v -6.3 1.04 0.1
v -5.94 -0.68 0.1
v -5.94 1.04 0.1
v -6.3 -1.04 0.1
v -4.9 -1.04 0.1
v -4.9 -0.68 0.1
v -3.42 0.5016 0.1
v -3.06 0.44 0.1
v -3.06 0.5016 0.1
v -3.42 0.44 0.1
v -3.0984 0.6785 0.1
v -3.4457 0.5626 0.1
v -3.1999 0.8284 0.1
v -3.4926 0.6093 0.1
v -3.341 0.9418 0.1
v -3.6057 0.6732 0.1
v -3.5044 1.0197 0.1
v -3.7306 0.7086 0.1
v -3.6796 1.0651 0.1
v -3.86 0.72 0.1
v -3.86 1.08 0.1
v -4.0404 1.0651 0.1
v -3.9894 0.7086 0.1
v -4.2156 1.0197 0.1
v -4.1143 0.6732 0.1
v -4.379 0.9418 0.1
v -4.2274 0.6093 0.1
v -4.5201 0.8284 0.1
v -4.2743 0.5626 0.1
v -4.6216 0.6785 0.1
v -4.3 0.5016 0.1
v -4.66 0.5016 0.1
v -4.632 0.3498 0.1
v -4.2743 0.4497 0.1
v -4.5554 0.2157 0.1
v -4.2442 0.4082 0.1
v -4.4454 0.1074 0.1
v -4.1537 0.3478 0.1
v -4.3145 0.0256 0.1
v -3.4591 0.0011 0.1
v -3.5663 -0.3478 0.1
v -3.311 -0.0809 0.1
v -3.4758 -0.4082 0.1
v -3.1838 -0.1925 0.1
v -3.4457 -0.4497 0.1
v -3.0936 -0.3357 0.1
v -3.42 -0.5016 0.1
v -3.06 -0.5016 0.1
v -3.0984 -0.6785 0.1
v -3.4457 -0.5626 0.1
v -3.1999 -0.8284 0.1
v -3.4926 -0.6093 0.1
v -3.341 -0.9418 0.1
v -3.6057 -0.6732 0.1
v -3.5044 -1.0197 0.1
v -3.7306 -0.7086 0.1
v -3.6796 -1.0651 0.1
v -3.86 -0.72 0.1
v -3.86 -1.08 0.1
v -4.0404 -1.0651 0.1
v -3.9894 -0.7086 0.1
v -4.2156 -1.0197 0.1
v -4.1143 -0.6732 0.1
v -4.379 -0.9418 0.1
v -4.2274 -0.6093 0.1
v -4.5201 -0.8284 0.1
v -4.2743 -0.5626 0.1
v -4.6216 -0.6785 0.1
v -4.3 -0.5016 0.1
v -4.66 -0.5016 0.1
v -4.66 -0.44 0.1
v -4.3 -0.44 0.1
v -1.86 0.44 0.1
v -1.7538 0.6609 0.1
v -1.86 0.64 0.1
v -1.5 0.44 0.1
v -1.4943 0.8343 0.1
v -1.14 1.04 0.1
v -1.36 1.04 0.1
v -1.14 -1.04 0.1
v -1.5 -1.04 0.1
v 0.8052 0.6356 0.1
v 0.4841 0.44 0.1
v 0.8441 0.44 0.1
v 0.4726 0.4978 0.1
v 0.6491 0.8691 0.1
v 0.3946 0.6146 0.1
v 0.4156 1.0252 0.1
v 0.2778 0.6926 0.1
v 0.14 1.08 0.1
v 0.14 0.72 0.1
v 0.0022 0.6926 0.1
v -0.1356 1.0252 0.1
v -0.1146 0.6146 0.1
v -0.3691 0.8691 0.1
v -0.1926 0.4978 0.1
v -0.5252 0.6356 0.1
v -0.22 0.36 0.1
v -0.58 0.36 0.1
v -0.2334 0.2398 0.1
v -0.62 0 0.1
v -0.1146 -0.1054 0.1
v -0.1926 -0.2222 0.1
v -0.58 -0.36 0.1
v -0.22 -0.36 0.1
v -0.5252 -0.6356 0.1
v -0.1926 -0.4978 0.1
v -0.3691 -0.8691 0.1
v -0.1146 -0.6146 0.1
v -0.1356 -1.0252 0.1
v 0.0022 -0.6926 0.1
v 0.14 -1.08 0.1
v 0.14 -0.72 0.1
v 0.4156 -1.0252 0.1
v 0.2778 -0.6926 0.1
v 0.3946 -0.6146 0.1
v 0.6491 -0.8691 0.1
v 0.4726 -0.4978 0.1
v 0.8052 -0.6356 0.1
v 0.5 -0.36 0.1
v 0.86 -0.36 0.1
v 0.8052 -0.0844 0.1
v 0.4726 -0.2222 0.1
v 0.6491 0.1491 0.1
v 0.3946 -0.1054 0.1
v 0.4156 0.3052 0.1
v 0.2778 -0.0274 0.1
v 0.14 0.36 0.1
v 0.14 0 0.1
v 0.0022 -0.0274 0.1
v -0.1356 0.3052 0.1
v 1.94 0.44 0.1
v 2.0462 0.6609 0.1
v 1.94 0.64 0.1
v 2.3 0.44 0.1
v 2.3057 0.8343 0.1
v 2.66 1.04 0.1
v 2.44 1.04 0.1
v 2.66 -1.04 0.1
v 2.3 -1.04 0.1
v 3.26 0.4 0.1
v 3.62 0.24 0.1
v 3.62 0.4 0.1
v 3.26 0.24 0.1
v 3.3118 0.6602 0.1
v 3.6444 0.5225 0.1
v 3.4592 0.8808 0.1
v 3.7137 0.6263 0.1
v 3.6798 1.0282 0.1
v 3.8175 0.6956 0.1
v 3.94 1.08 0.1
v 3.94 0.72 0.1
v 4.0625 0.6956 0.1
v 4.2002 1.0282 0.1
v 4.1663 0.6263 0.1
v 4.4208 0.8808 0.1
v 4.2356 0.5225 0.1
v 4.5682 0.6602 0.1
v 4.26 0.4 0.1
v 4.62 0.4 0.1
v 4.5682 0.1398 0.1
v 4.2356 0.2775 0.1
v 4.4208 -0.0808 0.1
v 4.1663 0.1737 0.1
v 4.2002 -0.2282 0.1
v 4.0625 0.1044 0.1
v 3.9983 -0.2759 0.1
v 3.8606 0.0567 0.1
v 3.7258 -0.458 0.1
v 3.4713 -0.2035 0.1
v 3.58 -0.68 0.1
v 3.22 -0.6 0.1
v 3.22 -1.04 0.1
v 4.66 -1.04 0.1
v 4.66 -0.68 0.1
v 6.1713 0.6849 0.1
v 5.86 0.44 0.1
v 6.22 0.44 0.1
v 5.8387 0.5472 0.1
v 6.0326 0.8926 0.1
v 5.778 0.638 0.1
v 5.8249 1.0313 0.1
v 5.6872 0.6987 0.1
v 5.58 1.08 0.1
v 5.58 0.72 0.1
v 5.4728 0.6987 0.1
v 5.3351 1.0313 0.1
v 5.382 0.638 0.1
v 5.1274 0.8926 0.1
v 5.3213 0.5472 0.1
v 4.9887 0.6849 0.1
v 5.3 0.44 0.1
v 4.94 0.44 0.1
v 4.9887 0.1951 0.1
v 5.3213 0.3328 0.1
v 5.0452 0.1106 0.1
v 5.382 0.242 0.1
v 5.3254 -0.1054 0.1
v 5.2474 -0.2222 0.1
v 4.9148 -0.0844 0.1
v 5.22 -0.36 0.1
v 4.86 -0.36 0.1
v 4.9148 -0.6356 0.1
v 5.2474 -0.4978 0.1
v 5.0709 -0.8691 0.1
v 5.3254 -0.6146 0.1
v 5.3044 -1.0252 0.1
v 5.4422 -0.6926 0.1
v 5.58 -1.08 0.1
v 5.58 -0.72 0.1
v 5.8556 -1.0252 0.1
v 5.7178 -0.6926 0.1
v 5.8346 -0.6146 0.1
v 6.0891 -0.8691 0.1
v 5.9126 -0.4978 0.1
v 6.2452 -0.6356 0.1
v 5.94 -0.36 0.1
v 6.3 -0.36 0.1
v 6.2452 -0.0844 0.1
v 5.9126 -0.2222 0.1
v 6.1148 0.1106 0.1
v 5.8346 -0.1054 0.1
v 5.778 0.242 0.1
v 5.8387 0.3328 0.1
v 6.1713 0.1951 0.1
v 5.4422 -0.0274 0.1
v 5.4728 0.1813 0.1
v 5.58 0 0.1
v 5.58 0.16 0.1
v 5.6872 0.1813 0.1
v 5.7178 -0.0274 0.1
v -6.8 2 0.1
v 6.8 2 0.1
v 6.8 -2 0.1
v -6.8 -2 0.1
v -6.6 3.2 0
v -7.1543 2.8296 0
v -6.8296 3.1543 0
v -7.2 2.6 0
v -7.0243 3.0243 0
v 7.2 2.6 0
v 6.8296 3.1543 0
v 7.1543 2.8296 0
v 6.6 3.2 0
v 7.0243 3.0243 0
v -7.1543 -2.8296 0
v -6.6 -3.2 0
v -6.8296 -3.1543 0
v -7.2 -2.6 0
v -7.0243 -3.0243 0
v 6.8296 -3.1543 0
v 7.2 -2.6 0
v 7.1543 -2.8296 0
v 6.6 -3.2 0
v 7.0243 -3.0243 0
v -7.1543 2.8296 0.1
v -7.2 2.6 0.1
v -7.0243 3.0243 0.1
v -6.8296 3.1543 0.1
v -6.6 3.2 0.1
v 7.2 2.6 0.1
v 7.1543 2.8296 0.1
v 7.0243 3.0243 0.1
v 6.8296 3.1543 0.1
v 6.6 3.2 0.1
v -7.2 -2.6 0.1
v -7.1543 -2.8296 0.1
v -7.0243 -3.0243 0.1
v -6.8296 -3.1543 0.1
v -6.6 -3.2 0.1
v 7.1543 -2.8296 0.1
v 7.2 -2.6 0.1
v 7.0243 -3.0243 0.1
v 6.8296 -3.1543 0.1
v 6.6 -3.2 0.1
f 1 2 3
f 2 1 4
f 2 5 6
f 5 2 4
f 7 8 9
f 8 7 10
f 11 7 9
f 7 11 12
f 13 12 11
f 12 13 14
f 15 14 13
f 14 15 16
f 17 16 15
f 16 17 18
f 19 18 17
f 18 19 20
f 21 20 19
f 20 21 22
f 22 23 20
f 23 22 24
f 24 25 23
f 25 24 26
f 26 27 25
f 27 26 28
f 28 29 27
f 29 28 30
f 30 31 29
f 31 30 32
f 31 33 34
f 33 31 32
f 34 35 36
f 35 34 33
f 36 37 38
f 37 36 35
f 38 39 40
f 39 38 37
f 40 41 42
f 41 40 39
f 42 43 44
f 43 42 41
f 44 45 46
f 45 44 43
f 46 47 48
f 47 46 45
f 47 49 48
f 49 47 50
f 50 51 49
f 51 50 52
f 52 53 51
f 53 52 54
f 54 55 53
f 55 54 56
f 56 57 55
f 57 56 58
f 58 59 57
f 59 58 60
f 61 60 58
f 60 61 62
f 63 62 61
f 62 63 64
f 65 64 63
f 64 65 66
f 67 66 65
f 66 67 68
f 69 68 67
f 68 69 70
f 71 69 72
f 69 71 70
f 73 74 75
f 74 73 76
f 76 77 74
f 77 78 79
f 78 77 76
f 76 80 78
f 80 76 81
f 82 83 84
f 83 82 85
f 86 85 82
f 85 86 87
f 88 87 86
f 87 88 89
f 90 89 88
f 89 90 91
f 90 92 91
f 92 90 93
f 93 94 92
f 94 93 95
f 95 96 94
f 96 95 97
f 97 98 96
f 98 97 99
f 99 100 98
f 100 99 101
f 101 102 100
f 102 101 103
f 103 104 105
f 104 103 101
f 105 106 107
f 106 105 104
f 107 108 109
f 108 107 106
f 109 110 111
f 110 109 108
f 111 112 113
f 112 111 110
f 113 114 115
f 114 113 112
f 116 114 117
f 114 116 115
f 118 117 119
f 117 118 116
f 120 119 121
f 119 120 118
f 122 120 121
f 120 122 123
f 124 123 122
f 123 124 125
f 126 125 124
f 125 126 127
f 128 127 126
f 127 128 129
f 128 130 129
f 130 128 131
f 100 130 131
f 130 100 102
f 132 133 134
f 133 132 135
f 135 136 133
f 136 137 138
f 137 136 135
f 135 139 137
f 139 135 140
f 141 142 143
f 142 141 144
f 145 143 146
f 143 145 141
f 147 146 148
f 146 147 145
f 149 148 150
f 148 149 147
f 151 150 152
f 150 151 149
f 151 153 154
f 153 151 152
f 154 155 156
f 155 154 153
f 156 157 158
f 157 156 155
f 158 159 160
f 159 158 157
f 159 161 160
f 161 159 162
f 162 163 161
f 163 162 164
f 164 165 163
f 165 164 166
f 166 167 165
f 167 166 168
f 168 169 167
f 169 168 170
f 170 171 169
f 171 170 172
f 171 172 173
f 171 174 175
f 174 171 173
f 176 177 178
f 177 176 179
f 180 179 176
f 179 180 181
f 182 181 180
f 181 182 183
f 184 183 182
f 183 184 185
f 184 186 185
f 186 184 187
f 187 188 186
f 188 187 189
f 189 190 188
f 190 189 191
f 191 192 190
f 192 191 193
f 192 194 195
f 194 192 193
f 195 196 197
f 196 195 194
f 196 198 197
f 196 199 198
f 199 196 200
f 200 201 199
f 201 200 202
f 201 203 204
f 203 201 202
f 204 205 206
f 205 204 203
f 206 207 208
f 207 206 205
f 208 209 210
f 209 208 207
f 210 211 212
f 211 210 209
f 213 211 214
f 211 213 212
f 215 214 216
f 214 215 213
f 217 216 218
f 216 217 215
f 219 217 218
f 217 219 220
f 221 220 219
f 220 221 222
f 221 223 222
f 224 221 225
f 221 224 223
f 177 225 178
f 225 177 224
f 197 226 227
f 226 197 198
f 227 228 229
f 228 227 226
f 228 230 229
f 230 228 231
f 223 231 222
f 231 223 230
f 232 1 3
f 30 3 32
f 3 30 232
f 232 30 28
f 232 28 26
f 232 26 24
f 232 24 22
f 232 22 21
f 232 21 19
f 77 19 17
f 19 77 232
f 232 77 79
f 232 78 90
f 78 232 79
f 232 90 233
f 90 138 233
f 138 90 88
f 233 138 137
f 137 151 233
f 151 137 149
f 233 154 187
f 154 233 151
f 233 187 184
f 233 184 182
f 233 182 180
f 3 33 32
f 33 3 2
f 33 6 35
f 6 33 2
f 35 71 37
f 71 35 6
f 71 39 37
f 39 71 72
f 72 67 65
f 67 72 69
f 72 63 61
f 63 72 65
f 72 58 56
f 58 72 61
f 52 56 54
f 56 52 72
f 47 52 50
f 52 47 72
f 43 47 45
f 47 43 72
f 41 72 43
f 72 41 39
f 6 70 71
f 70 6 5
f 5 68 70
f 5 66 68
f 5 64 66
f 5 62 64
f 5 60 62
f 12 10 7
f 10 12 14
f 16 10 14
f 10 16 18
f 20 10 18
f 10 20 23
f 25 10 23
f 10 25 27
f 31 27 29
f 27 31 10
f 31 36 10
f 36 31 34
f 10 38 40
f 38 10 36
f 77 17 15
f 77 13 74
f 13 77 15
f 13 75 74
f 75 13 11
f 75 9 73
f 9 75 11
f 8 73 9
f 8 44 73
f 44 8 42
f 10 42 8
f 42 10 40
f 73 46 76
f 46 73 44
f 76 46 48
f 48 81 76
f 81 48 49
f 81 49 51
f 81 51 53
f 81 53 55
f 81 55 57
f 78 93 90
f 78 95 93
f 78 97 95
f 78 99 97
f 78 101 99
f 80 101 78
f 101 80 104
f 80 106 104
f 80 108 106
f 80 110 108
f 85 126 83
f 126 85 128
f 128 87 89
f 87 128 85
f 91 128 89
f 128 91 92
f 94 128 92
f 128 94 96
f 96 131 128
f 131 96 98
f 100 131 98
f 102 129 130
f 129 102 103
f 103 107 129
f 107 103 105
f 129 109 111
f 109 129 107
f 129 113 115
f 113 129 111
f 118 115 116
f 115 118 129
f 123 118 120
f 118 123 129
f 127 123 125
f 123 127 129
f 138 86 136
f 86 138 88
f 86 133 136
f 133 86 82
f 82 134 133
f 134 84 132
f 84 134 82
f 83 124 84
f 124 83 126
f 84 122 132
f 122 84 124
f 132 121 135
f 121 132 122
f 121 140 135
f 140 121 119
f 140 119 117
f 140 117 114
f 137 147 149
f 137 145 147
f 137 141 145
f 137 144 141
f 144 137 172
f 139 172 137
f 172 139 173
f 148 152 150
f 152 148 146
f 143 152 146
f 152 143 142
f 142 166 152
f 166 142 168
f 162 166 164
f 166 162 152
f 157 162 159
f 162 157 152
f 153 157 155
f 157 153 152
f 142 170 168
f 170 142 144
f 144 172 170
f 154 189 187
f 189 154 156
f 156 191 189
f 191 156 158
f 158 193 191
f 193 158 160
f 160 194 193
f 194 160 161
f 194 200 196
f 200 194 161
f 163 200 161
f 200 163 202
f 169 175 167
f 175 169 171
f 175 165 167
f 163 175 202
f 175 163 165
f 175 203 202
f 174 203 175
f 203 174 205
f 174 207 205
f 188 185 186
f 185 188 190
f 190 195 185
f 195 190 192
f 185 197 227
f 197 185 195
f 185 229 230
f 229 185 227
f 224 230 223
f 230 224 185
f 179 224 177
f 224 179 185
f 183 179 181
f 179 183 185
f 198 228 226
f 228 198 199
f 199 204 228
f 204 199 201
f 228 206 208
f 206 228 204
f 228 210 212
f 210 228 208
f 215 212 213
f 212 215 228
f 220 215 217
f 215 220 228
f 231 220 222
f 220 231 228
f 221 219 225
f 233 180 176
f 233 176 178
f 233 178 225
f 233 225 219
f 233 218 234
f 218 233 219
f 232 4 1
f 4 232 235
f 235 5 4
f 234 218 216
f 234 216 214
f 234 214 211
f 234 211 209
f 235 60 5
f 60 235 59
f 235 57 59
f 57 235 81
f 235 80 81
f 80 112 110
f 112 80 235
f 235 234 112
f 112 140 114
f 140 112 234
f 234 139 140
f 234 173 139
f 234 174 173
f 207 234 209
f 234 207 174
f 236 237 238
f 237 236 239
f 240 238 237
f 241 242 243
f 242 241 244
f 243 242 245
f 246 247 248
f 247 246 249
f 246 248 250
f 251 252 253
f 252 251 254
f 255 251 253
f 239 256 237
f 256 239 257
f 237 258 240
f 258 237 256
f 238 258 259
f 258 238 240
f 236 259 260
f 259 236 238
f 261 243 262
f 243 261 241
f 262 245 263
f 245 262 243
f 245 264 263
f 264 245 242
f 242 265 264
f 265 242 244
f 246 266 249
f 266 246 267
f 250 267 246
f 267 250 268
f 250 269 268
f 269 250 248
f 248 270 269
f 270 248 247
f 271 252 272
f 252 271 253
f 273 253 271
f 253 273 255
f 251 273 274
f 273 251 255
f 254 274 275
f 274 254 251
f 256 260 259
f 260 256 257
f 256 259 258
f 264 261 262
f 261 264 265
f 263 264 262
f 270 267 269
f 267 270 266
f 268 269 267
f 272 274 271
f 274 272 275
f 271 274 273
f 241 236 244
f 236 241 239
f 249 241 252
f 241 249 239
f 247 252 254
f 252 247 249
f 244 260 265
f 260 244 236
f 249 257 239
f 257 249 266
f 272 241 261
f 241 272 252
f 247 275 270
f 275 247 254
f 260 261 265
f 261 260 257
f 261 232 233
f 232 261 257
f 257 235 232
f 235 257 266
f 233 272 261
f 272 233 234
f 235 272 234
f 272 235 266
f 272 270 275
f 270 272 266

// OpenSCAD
// file: ../p/1-4cyli.scad
use <../lib.scad>
function ldraw_lib__1_4cyli() = [
// 0 Cylinder 0.25
// 0 Name: 1-4cyli.dat
// 0 Author: James Jessiman
// 0 !LDRAW_ORG Primitive UPDATE 2012-01
// 0 !LICENSE Licensed under CC BY 4.0 : see CAreadme.txt
// 
// 0 BFC CERTIFY CCW
  [0,"BFC","CERTIFY"],
  [0,"BFC","CCW"],
// 
// 0 !HISTORY 2002-03-23 [sbliss] Added BFC statement.
// 0 !HISTORY 2002-04-25 [PTadmin] Official Update 2002-02
// 0 !HISTORY 2007-06-22 [PTadmin] Header formatted for Contributor Agreement
// 0 !HISTORY 2008-07-01 [PTadmin] Official Update 2008-01
// 0 !HISTORY 2012-02-16 [Philo] Changed to CCW
// 0 !HISTORY 2012-03-30 [PTadmin] Official Update 2012-01
// 
// 
// 4 16 1 1 0 0.9239 1 0.3827 0.9239 0 0.3827 1 0 0
  [4,16,1,1,0,0.9239,1,0.3827,0.9239,0,0.3827,1,0,0],
// 5 24 1 0 0 1 1 0 0.9239 0 0.3827 1 0 -1
  [5,24,1,0,0,1,1,0,0.9239,0,0.3827,1,0,-1],
// 4 16 0.9239 1 0.3827 0.7071 1 0.7071 0.7071 0 0.7071 0.9239 0 0.3827
  [4,16,0.9239,1,0.3827,0.7071,1,0.7071,0.7071,0,0.7071,0.9239,0,0.3827],
// 5 24 0.9239 0 0.3827 0.9239 1 0.3827 0.7071 0 0.7071 1 0 0
  [5,24,0.9239,0,0.3827,0.9239,1,0.3827,0.7071,0,0.7071,1,0,0],
// 4 16 0.7071 1 0.7071 0.3827 1 0.9239 0.3827 0 0.9239 0.7071 0 0.7071
  [4,16,0.7071,1,0.7071,0.3827,1,0.9239,0.3827,0,0.9239,0.7071,0,0.7071],
// 5 24 0.7071 0 0.7071 0.7071 1 0.7071 0.3827 0 0.9239 0.9239 0 0.3827
  [5,24,0.7071,0,0.7071,0.7071,1,0.7071,0.3827,0,0.9239,0.9239,0,0.3827],
// 4 16 0.3827 1 0.9239 0 1 1 0 0 1 0.3827 0 0.9239
  [4,16,0.3827,1,0.9239,0,1,1,0,0,1,0.3827,0,0.9239],
// 5 24 0.3827 0 0.9239 0.3827 1 0.9239 0 0 1 0.7071 0 0.7071
  [5,24,0.3827,0,0.9239,0.3827,1,0.9239,0,0,1,0.7071,0,0.7071],
// 5 24 0 0 1 0 1 1 0.3827 0 0.9239 -1 0 1
  [5,24,0,0,1,0,1,1,0.3827,0,0.9239,-1,0,1],
];
module ldraw_lib__1_4cyli(step=0, col=false, unit=2/5, alt=false, line=0.2, solid=!$preview)
    makepoly(ldraw_lib__1_4cyli(), step=step, col=col, unit=unit, alt=alt, line=line, solid=solid);
ldraw_lib__1_4cyli(line=0.2);
// file: ../p/1-4chrd.scad
use <../lib.scad>
function ldraw_lib__1_4chrd() = [
// 0 Chord 0.25
// 0 Name: 1-4chrd.dat
// 0 Author: Max Martin Richter [MMR1988]
// 0 !LDRAW_ORG Primitive UPDATE 2023-05
// 0 !LICENSE Licensed under CC BY 4.0 : see CAreadme.txt
// 
// 0 BFC CERTIFY CCW
  [0,"BFC","CERTIFY"],
  [0,"BFC","CCW"],
// 
// 0 !HISTORY 2004-04-22 [PTadmin] Official Update 2004-02
// 0 !HISTORY 2007-10-09 [PTadmin] Header formatted for Contributor Agreement
// 0 !HISTORY 2008-07-01 [PTadmin] Official Update 2008-01
// 0 !HISTORY 2012-08-02 [MMR1988] Re-creation with PrimGen2 and Rectifier
// 0 !HISTORY 2012-08-09 [PTadmin] Official Update 2012-02
// 0 !HISTORY 2023-10-27 [OrionP] Change author to MMR1988 from hafhead
// 0 !HISTORY 2023-10-31 [OrionP] Official Update 2023-05
// 
// 4 16 0.9239 0 0.3827 0.3827 0 0.9239 0 0 1 1 0 0
  [4,16,0.9239,0,0.3827,0.3827,0,0.9239,0,0,1,1,0,0],
// 3 16 0.7071 0 0.7071 0.3827 0 0.9239 0.9239 0 0.3827
  [3,16,0.7071,0,0.7071,0.3827,0,0.9239,0.9239,0,0.3827],
];
module ldraw_lib__1_4chrd(step=0, col=false, unit=2/5, alt=false, line=0.2, solid=!$preview)
    makepoly(ldraw_lib__1_4chrd(), step=step, col=col, unit=unit, alt=alt, line=line, solid=solid);
ldraw_lib__1_4chrd(line=0.2);
// main file
use <../lib.scad>
use <../p/1-4chrd.scad>
use <../p/1-4cyli.scad>
use <s/6141875bs01.scad>
function ldraw_lib__6141875b() = [
// 0 Sticker  0.8 x  1.8 with Black Number Plate "LS 16 128" on White Background
// 0 Name: 6141875b.dat
// 0 Author: Massimo Maso [Sirio]
// 0 !LDRAW_ORG Part UPDATE 2023-06
// 0 !LICENSE Licensed under CC BY 4.0 : see CAreadme.txt
// 
// 0 BFC CERTIFY CCW
  [0,"BFC","CERTIFY"],
  [0,"BFC","CCW"],
// 
// 0 !KEYWORDS Bricklink 75875stk01, Brickowl 53567, F-150, Ford, Raptor
// 0 !KEYWORDS Rebrickable 24760, Set 75875, Speed Champions
// 
// 0 !HISTORY 2023-11-19 [OrionP] Official Update 2023-06
// 
// 
// 0 // Subparts
// 
// 1 16 0 -.25 0 1 0 0 0 1 0 0 0 1 s\6141875bs01.dat
  [1,16,0,-.25,0,1,0,0,0,1,0,0,0,1, ldraw_lib__s__6141875bs01()],
// 0 // Primitives
// 1 16 -16.5 0 6.5 -1.5 0 0 0 -1 0 0 0 1.5 1-4chrd.dat
  [1,16,-16.5,0,6.5,-1.5,0,0,0,-1,0,0,0,1.5, ldraw_lib__1_4chrd()],
// 1 16 16.5 0 6.5 1.5 0 0 0 -1 0 0 0 1.5 1-4chrd.dat
  [1,16,16.5,0,6.5,1.5,0,0,0,-1,0,0,0,1.5, ldraw_lib__1_4chrd()],
// 1 16 -16.5 0 -6.5 -1.5 0 0 0 -1 0 0 0 -1.5 1-4chrd.dat
  [1,16,-16.5,0,-6.5,-1.5,0,0,0,-1,0,0,0,-1.5, ldraw_lib__1_4chrd()],
// 1 16 16.5 0 -6.5 1.5 0 0 0 -1 0 0 0 -1.5 1-4chrd.dat
  [1,16,16.5,0,-6.5,1.5,0,0,0,-1,0,0,0,-1.5, ldraw_lib__1_4chrd()],
// 1 16 -16.5 0 6.5 -1.5 0 0 0 -.25 0 0 0 1.5 1-4cyli.dat
  [1,16,-16.5,0,6.5,-1.5,0,0,0,-.25,0,0,0,1.5, ldraw_lib__1_4cyli()],
// 1 16 16.5 0 6.5 1.5 0 0 0 -.25 0 0 0 1.5 1-4cyli.dat
  [1,16,16.5,0,6.5,1.5,0,0,0,-.25,0,0,0,1.5, ldraw_lib__1_4cyli()],
// 1 16 -16.5 0 -6.5 -1.5 0 0 0 -.25 0 0 0 -1.5 1-4cyli.dat
  [1,16,-16.5,0,-6.5,-1.5,0,0,0,-.25,0,0,0,-1.5, ldraw_lib__1_4cyli()],
// 1 16 16.5 0 -6.5 1.5 0 0 0 -.25 0 0 0 -1.5 1-4cyli.dat
  [1,16,16.5,0,-6.5,1.5,0,0,0,-.25,0,0,0,-1.5, ldraw_lib__1_4cyli()],
// 1 15 -16.5 -.25 6.5 -1.5 0 0 0 1 0 0 0 1.5 1-4chrd.dat
  [1,15,-16.5,-.25,6.5,-1.5,0,0,0,1,0,0,0,1.5, ldraw_lib__1_4chrd()],
// 1 15 16.5 -.25 6.5 1.5 0 0 0 1 0 0 0 1.5 1-4chrd.dat
  [1,15,16.5,-.25,6.5,1.5,0,0,0,1,0,0,0,1.5, ldraw_lib__1_4chrd()],
// 1 15 -16.5 -.25 -6.5 -1.5 0 0 0 1 0 0 0 -1.5 1-4chrd.dat
  [1,15,-16.5,-.25,-6.5,-1.5,0,0,0,1,0,0,0,-1.5, ldraw_lib__1_4chrd()],
// 1 15 16.5 -.25 -6.5 1.5 0 0 0 1 0 0 0 -1.5 1-4chrd.dat
  [1,15,16.5,-.25,-6.5,1.5,0,0,0,1,0,0,0,-1.5, ldraw_lib__1_4chrd()],
// 0 // Bottom face
// 4 16 16.5 0 8 18 0 6.5 -18 0 6.5 -16.5 0 8
  [4,16,16.5,0,8,18,0,6.5,-18,0,6.5,-16.5,0,8],
// 4 16 18 0 6.5 18 0 -6.5 -18 0 -6.5 -18 0 6.5
  [4,16,18,0,6.5,18,0,-6.5,-18,0,-6.5,-18,0,6.5],
// 4 16 16.5 0 -8 -16.5 0 -8 -18 0 -6.5 18 0 -6.5
  [4,16,16.5,0,-8,-16.5,0,-8,-18,0,-6.5,18,0,-6.5],
// 0 // Lateral face
// 4 16 -16.5 0 8 -16.5 -.25 8 16.5 -.25 8 16.5 0 8
  [4,16,-16.5,0,8,-16.5,-.25,8,16.5,-.25,8,16.5,0,8],
// 4 16 -18 0 6.5 -18 0 -6.5 -18 -.25 -6.5 -18 -.25 6.5
  [4,16,-18,0,6.5,-18,0,-6.5,-18,-.25,-6.5,-18,-.25,6.5],
// 4 16 18 0 6.5 18 -.25 6.5 18 -.25 -6.5 18 0 -6.5
  [4,16,18,0,6.5,18,-.25,6.5,18,-.25,-6.5,18,0,-6.5],
// 4 16 -16.5 0 -8 16.5 0 -8 16.5 -.25 -8 -16.5 -.25 -8
  [4,16,-16.5,0,-8,16.5,0,-8,16.5,-.25,-8,-16.5,-.25,-8],
// 0 // Top face
// 4 15 -18 -.25 6.5 18 -.25 6.5 16.5 -.25 8 -16.5 -.25 8
  [4,15,-18,-.25,6.5,18,-.25,6.5,16.5,-.25,8,-16.5,-.25,8],
// 4 15 -18 -.25 6.5 -17 -.25 5 17 -.25 5 18 -.25 6.5
  [4,15,-18,-.25,6.5,-17,-.25,5,17,-.25,5,18,-.25,6.5],
// 4 15 -18 -.25 6.5 -18 -.25 -6.5 -17 -.25 -5 -17 -.25 5
  [4,15,-18,-.25,6.5,-18,-.25,-6.5,-17,-.25,-5,-17,-.25,5],
// 4 15 18 -.25 -6.5 18 -.25 6.5 17 -.25 5 17 -.25 -5
  [4,15,18,-.25,-6.5,18,-.25,6.5,17,-.25,5,17,-.25,-5],
// 4 15 18 -.25 -6.5 17 -.25 -5 -17 -.25 -5 -18 -.25 -6.5
  [4,15,18,-.25,-6.5,17,-.25,-5,-17,-.25,-5,-18,-.25,-6.5],
// 4 15 18 -.25 -6.5 -18 -.25 -6.5 -16.5 -.25 -8 16.5 -.25 -8
  [4,15,18,-.25,-6.5,-18,-.25,-6.5,-16.5,-.25,-8,16.5,-.25,-8],
];
module ldraw_lib__6141875b(step=0, col=false, unit=2/5, alt=false, line=0.2, solid=!$preview)
    makepoly(ldraw_lib__6141875b(), step=step, col=col, unit=unit, alt=alt, line=line, solid=solid);
ldraw_lib__6141875b(line=0.2);
